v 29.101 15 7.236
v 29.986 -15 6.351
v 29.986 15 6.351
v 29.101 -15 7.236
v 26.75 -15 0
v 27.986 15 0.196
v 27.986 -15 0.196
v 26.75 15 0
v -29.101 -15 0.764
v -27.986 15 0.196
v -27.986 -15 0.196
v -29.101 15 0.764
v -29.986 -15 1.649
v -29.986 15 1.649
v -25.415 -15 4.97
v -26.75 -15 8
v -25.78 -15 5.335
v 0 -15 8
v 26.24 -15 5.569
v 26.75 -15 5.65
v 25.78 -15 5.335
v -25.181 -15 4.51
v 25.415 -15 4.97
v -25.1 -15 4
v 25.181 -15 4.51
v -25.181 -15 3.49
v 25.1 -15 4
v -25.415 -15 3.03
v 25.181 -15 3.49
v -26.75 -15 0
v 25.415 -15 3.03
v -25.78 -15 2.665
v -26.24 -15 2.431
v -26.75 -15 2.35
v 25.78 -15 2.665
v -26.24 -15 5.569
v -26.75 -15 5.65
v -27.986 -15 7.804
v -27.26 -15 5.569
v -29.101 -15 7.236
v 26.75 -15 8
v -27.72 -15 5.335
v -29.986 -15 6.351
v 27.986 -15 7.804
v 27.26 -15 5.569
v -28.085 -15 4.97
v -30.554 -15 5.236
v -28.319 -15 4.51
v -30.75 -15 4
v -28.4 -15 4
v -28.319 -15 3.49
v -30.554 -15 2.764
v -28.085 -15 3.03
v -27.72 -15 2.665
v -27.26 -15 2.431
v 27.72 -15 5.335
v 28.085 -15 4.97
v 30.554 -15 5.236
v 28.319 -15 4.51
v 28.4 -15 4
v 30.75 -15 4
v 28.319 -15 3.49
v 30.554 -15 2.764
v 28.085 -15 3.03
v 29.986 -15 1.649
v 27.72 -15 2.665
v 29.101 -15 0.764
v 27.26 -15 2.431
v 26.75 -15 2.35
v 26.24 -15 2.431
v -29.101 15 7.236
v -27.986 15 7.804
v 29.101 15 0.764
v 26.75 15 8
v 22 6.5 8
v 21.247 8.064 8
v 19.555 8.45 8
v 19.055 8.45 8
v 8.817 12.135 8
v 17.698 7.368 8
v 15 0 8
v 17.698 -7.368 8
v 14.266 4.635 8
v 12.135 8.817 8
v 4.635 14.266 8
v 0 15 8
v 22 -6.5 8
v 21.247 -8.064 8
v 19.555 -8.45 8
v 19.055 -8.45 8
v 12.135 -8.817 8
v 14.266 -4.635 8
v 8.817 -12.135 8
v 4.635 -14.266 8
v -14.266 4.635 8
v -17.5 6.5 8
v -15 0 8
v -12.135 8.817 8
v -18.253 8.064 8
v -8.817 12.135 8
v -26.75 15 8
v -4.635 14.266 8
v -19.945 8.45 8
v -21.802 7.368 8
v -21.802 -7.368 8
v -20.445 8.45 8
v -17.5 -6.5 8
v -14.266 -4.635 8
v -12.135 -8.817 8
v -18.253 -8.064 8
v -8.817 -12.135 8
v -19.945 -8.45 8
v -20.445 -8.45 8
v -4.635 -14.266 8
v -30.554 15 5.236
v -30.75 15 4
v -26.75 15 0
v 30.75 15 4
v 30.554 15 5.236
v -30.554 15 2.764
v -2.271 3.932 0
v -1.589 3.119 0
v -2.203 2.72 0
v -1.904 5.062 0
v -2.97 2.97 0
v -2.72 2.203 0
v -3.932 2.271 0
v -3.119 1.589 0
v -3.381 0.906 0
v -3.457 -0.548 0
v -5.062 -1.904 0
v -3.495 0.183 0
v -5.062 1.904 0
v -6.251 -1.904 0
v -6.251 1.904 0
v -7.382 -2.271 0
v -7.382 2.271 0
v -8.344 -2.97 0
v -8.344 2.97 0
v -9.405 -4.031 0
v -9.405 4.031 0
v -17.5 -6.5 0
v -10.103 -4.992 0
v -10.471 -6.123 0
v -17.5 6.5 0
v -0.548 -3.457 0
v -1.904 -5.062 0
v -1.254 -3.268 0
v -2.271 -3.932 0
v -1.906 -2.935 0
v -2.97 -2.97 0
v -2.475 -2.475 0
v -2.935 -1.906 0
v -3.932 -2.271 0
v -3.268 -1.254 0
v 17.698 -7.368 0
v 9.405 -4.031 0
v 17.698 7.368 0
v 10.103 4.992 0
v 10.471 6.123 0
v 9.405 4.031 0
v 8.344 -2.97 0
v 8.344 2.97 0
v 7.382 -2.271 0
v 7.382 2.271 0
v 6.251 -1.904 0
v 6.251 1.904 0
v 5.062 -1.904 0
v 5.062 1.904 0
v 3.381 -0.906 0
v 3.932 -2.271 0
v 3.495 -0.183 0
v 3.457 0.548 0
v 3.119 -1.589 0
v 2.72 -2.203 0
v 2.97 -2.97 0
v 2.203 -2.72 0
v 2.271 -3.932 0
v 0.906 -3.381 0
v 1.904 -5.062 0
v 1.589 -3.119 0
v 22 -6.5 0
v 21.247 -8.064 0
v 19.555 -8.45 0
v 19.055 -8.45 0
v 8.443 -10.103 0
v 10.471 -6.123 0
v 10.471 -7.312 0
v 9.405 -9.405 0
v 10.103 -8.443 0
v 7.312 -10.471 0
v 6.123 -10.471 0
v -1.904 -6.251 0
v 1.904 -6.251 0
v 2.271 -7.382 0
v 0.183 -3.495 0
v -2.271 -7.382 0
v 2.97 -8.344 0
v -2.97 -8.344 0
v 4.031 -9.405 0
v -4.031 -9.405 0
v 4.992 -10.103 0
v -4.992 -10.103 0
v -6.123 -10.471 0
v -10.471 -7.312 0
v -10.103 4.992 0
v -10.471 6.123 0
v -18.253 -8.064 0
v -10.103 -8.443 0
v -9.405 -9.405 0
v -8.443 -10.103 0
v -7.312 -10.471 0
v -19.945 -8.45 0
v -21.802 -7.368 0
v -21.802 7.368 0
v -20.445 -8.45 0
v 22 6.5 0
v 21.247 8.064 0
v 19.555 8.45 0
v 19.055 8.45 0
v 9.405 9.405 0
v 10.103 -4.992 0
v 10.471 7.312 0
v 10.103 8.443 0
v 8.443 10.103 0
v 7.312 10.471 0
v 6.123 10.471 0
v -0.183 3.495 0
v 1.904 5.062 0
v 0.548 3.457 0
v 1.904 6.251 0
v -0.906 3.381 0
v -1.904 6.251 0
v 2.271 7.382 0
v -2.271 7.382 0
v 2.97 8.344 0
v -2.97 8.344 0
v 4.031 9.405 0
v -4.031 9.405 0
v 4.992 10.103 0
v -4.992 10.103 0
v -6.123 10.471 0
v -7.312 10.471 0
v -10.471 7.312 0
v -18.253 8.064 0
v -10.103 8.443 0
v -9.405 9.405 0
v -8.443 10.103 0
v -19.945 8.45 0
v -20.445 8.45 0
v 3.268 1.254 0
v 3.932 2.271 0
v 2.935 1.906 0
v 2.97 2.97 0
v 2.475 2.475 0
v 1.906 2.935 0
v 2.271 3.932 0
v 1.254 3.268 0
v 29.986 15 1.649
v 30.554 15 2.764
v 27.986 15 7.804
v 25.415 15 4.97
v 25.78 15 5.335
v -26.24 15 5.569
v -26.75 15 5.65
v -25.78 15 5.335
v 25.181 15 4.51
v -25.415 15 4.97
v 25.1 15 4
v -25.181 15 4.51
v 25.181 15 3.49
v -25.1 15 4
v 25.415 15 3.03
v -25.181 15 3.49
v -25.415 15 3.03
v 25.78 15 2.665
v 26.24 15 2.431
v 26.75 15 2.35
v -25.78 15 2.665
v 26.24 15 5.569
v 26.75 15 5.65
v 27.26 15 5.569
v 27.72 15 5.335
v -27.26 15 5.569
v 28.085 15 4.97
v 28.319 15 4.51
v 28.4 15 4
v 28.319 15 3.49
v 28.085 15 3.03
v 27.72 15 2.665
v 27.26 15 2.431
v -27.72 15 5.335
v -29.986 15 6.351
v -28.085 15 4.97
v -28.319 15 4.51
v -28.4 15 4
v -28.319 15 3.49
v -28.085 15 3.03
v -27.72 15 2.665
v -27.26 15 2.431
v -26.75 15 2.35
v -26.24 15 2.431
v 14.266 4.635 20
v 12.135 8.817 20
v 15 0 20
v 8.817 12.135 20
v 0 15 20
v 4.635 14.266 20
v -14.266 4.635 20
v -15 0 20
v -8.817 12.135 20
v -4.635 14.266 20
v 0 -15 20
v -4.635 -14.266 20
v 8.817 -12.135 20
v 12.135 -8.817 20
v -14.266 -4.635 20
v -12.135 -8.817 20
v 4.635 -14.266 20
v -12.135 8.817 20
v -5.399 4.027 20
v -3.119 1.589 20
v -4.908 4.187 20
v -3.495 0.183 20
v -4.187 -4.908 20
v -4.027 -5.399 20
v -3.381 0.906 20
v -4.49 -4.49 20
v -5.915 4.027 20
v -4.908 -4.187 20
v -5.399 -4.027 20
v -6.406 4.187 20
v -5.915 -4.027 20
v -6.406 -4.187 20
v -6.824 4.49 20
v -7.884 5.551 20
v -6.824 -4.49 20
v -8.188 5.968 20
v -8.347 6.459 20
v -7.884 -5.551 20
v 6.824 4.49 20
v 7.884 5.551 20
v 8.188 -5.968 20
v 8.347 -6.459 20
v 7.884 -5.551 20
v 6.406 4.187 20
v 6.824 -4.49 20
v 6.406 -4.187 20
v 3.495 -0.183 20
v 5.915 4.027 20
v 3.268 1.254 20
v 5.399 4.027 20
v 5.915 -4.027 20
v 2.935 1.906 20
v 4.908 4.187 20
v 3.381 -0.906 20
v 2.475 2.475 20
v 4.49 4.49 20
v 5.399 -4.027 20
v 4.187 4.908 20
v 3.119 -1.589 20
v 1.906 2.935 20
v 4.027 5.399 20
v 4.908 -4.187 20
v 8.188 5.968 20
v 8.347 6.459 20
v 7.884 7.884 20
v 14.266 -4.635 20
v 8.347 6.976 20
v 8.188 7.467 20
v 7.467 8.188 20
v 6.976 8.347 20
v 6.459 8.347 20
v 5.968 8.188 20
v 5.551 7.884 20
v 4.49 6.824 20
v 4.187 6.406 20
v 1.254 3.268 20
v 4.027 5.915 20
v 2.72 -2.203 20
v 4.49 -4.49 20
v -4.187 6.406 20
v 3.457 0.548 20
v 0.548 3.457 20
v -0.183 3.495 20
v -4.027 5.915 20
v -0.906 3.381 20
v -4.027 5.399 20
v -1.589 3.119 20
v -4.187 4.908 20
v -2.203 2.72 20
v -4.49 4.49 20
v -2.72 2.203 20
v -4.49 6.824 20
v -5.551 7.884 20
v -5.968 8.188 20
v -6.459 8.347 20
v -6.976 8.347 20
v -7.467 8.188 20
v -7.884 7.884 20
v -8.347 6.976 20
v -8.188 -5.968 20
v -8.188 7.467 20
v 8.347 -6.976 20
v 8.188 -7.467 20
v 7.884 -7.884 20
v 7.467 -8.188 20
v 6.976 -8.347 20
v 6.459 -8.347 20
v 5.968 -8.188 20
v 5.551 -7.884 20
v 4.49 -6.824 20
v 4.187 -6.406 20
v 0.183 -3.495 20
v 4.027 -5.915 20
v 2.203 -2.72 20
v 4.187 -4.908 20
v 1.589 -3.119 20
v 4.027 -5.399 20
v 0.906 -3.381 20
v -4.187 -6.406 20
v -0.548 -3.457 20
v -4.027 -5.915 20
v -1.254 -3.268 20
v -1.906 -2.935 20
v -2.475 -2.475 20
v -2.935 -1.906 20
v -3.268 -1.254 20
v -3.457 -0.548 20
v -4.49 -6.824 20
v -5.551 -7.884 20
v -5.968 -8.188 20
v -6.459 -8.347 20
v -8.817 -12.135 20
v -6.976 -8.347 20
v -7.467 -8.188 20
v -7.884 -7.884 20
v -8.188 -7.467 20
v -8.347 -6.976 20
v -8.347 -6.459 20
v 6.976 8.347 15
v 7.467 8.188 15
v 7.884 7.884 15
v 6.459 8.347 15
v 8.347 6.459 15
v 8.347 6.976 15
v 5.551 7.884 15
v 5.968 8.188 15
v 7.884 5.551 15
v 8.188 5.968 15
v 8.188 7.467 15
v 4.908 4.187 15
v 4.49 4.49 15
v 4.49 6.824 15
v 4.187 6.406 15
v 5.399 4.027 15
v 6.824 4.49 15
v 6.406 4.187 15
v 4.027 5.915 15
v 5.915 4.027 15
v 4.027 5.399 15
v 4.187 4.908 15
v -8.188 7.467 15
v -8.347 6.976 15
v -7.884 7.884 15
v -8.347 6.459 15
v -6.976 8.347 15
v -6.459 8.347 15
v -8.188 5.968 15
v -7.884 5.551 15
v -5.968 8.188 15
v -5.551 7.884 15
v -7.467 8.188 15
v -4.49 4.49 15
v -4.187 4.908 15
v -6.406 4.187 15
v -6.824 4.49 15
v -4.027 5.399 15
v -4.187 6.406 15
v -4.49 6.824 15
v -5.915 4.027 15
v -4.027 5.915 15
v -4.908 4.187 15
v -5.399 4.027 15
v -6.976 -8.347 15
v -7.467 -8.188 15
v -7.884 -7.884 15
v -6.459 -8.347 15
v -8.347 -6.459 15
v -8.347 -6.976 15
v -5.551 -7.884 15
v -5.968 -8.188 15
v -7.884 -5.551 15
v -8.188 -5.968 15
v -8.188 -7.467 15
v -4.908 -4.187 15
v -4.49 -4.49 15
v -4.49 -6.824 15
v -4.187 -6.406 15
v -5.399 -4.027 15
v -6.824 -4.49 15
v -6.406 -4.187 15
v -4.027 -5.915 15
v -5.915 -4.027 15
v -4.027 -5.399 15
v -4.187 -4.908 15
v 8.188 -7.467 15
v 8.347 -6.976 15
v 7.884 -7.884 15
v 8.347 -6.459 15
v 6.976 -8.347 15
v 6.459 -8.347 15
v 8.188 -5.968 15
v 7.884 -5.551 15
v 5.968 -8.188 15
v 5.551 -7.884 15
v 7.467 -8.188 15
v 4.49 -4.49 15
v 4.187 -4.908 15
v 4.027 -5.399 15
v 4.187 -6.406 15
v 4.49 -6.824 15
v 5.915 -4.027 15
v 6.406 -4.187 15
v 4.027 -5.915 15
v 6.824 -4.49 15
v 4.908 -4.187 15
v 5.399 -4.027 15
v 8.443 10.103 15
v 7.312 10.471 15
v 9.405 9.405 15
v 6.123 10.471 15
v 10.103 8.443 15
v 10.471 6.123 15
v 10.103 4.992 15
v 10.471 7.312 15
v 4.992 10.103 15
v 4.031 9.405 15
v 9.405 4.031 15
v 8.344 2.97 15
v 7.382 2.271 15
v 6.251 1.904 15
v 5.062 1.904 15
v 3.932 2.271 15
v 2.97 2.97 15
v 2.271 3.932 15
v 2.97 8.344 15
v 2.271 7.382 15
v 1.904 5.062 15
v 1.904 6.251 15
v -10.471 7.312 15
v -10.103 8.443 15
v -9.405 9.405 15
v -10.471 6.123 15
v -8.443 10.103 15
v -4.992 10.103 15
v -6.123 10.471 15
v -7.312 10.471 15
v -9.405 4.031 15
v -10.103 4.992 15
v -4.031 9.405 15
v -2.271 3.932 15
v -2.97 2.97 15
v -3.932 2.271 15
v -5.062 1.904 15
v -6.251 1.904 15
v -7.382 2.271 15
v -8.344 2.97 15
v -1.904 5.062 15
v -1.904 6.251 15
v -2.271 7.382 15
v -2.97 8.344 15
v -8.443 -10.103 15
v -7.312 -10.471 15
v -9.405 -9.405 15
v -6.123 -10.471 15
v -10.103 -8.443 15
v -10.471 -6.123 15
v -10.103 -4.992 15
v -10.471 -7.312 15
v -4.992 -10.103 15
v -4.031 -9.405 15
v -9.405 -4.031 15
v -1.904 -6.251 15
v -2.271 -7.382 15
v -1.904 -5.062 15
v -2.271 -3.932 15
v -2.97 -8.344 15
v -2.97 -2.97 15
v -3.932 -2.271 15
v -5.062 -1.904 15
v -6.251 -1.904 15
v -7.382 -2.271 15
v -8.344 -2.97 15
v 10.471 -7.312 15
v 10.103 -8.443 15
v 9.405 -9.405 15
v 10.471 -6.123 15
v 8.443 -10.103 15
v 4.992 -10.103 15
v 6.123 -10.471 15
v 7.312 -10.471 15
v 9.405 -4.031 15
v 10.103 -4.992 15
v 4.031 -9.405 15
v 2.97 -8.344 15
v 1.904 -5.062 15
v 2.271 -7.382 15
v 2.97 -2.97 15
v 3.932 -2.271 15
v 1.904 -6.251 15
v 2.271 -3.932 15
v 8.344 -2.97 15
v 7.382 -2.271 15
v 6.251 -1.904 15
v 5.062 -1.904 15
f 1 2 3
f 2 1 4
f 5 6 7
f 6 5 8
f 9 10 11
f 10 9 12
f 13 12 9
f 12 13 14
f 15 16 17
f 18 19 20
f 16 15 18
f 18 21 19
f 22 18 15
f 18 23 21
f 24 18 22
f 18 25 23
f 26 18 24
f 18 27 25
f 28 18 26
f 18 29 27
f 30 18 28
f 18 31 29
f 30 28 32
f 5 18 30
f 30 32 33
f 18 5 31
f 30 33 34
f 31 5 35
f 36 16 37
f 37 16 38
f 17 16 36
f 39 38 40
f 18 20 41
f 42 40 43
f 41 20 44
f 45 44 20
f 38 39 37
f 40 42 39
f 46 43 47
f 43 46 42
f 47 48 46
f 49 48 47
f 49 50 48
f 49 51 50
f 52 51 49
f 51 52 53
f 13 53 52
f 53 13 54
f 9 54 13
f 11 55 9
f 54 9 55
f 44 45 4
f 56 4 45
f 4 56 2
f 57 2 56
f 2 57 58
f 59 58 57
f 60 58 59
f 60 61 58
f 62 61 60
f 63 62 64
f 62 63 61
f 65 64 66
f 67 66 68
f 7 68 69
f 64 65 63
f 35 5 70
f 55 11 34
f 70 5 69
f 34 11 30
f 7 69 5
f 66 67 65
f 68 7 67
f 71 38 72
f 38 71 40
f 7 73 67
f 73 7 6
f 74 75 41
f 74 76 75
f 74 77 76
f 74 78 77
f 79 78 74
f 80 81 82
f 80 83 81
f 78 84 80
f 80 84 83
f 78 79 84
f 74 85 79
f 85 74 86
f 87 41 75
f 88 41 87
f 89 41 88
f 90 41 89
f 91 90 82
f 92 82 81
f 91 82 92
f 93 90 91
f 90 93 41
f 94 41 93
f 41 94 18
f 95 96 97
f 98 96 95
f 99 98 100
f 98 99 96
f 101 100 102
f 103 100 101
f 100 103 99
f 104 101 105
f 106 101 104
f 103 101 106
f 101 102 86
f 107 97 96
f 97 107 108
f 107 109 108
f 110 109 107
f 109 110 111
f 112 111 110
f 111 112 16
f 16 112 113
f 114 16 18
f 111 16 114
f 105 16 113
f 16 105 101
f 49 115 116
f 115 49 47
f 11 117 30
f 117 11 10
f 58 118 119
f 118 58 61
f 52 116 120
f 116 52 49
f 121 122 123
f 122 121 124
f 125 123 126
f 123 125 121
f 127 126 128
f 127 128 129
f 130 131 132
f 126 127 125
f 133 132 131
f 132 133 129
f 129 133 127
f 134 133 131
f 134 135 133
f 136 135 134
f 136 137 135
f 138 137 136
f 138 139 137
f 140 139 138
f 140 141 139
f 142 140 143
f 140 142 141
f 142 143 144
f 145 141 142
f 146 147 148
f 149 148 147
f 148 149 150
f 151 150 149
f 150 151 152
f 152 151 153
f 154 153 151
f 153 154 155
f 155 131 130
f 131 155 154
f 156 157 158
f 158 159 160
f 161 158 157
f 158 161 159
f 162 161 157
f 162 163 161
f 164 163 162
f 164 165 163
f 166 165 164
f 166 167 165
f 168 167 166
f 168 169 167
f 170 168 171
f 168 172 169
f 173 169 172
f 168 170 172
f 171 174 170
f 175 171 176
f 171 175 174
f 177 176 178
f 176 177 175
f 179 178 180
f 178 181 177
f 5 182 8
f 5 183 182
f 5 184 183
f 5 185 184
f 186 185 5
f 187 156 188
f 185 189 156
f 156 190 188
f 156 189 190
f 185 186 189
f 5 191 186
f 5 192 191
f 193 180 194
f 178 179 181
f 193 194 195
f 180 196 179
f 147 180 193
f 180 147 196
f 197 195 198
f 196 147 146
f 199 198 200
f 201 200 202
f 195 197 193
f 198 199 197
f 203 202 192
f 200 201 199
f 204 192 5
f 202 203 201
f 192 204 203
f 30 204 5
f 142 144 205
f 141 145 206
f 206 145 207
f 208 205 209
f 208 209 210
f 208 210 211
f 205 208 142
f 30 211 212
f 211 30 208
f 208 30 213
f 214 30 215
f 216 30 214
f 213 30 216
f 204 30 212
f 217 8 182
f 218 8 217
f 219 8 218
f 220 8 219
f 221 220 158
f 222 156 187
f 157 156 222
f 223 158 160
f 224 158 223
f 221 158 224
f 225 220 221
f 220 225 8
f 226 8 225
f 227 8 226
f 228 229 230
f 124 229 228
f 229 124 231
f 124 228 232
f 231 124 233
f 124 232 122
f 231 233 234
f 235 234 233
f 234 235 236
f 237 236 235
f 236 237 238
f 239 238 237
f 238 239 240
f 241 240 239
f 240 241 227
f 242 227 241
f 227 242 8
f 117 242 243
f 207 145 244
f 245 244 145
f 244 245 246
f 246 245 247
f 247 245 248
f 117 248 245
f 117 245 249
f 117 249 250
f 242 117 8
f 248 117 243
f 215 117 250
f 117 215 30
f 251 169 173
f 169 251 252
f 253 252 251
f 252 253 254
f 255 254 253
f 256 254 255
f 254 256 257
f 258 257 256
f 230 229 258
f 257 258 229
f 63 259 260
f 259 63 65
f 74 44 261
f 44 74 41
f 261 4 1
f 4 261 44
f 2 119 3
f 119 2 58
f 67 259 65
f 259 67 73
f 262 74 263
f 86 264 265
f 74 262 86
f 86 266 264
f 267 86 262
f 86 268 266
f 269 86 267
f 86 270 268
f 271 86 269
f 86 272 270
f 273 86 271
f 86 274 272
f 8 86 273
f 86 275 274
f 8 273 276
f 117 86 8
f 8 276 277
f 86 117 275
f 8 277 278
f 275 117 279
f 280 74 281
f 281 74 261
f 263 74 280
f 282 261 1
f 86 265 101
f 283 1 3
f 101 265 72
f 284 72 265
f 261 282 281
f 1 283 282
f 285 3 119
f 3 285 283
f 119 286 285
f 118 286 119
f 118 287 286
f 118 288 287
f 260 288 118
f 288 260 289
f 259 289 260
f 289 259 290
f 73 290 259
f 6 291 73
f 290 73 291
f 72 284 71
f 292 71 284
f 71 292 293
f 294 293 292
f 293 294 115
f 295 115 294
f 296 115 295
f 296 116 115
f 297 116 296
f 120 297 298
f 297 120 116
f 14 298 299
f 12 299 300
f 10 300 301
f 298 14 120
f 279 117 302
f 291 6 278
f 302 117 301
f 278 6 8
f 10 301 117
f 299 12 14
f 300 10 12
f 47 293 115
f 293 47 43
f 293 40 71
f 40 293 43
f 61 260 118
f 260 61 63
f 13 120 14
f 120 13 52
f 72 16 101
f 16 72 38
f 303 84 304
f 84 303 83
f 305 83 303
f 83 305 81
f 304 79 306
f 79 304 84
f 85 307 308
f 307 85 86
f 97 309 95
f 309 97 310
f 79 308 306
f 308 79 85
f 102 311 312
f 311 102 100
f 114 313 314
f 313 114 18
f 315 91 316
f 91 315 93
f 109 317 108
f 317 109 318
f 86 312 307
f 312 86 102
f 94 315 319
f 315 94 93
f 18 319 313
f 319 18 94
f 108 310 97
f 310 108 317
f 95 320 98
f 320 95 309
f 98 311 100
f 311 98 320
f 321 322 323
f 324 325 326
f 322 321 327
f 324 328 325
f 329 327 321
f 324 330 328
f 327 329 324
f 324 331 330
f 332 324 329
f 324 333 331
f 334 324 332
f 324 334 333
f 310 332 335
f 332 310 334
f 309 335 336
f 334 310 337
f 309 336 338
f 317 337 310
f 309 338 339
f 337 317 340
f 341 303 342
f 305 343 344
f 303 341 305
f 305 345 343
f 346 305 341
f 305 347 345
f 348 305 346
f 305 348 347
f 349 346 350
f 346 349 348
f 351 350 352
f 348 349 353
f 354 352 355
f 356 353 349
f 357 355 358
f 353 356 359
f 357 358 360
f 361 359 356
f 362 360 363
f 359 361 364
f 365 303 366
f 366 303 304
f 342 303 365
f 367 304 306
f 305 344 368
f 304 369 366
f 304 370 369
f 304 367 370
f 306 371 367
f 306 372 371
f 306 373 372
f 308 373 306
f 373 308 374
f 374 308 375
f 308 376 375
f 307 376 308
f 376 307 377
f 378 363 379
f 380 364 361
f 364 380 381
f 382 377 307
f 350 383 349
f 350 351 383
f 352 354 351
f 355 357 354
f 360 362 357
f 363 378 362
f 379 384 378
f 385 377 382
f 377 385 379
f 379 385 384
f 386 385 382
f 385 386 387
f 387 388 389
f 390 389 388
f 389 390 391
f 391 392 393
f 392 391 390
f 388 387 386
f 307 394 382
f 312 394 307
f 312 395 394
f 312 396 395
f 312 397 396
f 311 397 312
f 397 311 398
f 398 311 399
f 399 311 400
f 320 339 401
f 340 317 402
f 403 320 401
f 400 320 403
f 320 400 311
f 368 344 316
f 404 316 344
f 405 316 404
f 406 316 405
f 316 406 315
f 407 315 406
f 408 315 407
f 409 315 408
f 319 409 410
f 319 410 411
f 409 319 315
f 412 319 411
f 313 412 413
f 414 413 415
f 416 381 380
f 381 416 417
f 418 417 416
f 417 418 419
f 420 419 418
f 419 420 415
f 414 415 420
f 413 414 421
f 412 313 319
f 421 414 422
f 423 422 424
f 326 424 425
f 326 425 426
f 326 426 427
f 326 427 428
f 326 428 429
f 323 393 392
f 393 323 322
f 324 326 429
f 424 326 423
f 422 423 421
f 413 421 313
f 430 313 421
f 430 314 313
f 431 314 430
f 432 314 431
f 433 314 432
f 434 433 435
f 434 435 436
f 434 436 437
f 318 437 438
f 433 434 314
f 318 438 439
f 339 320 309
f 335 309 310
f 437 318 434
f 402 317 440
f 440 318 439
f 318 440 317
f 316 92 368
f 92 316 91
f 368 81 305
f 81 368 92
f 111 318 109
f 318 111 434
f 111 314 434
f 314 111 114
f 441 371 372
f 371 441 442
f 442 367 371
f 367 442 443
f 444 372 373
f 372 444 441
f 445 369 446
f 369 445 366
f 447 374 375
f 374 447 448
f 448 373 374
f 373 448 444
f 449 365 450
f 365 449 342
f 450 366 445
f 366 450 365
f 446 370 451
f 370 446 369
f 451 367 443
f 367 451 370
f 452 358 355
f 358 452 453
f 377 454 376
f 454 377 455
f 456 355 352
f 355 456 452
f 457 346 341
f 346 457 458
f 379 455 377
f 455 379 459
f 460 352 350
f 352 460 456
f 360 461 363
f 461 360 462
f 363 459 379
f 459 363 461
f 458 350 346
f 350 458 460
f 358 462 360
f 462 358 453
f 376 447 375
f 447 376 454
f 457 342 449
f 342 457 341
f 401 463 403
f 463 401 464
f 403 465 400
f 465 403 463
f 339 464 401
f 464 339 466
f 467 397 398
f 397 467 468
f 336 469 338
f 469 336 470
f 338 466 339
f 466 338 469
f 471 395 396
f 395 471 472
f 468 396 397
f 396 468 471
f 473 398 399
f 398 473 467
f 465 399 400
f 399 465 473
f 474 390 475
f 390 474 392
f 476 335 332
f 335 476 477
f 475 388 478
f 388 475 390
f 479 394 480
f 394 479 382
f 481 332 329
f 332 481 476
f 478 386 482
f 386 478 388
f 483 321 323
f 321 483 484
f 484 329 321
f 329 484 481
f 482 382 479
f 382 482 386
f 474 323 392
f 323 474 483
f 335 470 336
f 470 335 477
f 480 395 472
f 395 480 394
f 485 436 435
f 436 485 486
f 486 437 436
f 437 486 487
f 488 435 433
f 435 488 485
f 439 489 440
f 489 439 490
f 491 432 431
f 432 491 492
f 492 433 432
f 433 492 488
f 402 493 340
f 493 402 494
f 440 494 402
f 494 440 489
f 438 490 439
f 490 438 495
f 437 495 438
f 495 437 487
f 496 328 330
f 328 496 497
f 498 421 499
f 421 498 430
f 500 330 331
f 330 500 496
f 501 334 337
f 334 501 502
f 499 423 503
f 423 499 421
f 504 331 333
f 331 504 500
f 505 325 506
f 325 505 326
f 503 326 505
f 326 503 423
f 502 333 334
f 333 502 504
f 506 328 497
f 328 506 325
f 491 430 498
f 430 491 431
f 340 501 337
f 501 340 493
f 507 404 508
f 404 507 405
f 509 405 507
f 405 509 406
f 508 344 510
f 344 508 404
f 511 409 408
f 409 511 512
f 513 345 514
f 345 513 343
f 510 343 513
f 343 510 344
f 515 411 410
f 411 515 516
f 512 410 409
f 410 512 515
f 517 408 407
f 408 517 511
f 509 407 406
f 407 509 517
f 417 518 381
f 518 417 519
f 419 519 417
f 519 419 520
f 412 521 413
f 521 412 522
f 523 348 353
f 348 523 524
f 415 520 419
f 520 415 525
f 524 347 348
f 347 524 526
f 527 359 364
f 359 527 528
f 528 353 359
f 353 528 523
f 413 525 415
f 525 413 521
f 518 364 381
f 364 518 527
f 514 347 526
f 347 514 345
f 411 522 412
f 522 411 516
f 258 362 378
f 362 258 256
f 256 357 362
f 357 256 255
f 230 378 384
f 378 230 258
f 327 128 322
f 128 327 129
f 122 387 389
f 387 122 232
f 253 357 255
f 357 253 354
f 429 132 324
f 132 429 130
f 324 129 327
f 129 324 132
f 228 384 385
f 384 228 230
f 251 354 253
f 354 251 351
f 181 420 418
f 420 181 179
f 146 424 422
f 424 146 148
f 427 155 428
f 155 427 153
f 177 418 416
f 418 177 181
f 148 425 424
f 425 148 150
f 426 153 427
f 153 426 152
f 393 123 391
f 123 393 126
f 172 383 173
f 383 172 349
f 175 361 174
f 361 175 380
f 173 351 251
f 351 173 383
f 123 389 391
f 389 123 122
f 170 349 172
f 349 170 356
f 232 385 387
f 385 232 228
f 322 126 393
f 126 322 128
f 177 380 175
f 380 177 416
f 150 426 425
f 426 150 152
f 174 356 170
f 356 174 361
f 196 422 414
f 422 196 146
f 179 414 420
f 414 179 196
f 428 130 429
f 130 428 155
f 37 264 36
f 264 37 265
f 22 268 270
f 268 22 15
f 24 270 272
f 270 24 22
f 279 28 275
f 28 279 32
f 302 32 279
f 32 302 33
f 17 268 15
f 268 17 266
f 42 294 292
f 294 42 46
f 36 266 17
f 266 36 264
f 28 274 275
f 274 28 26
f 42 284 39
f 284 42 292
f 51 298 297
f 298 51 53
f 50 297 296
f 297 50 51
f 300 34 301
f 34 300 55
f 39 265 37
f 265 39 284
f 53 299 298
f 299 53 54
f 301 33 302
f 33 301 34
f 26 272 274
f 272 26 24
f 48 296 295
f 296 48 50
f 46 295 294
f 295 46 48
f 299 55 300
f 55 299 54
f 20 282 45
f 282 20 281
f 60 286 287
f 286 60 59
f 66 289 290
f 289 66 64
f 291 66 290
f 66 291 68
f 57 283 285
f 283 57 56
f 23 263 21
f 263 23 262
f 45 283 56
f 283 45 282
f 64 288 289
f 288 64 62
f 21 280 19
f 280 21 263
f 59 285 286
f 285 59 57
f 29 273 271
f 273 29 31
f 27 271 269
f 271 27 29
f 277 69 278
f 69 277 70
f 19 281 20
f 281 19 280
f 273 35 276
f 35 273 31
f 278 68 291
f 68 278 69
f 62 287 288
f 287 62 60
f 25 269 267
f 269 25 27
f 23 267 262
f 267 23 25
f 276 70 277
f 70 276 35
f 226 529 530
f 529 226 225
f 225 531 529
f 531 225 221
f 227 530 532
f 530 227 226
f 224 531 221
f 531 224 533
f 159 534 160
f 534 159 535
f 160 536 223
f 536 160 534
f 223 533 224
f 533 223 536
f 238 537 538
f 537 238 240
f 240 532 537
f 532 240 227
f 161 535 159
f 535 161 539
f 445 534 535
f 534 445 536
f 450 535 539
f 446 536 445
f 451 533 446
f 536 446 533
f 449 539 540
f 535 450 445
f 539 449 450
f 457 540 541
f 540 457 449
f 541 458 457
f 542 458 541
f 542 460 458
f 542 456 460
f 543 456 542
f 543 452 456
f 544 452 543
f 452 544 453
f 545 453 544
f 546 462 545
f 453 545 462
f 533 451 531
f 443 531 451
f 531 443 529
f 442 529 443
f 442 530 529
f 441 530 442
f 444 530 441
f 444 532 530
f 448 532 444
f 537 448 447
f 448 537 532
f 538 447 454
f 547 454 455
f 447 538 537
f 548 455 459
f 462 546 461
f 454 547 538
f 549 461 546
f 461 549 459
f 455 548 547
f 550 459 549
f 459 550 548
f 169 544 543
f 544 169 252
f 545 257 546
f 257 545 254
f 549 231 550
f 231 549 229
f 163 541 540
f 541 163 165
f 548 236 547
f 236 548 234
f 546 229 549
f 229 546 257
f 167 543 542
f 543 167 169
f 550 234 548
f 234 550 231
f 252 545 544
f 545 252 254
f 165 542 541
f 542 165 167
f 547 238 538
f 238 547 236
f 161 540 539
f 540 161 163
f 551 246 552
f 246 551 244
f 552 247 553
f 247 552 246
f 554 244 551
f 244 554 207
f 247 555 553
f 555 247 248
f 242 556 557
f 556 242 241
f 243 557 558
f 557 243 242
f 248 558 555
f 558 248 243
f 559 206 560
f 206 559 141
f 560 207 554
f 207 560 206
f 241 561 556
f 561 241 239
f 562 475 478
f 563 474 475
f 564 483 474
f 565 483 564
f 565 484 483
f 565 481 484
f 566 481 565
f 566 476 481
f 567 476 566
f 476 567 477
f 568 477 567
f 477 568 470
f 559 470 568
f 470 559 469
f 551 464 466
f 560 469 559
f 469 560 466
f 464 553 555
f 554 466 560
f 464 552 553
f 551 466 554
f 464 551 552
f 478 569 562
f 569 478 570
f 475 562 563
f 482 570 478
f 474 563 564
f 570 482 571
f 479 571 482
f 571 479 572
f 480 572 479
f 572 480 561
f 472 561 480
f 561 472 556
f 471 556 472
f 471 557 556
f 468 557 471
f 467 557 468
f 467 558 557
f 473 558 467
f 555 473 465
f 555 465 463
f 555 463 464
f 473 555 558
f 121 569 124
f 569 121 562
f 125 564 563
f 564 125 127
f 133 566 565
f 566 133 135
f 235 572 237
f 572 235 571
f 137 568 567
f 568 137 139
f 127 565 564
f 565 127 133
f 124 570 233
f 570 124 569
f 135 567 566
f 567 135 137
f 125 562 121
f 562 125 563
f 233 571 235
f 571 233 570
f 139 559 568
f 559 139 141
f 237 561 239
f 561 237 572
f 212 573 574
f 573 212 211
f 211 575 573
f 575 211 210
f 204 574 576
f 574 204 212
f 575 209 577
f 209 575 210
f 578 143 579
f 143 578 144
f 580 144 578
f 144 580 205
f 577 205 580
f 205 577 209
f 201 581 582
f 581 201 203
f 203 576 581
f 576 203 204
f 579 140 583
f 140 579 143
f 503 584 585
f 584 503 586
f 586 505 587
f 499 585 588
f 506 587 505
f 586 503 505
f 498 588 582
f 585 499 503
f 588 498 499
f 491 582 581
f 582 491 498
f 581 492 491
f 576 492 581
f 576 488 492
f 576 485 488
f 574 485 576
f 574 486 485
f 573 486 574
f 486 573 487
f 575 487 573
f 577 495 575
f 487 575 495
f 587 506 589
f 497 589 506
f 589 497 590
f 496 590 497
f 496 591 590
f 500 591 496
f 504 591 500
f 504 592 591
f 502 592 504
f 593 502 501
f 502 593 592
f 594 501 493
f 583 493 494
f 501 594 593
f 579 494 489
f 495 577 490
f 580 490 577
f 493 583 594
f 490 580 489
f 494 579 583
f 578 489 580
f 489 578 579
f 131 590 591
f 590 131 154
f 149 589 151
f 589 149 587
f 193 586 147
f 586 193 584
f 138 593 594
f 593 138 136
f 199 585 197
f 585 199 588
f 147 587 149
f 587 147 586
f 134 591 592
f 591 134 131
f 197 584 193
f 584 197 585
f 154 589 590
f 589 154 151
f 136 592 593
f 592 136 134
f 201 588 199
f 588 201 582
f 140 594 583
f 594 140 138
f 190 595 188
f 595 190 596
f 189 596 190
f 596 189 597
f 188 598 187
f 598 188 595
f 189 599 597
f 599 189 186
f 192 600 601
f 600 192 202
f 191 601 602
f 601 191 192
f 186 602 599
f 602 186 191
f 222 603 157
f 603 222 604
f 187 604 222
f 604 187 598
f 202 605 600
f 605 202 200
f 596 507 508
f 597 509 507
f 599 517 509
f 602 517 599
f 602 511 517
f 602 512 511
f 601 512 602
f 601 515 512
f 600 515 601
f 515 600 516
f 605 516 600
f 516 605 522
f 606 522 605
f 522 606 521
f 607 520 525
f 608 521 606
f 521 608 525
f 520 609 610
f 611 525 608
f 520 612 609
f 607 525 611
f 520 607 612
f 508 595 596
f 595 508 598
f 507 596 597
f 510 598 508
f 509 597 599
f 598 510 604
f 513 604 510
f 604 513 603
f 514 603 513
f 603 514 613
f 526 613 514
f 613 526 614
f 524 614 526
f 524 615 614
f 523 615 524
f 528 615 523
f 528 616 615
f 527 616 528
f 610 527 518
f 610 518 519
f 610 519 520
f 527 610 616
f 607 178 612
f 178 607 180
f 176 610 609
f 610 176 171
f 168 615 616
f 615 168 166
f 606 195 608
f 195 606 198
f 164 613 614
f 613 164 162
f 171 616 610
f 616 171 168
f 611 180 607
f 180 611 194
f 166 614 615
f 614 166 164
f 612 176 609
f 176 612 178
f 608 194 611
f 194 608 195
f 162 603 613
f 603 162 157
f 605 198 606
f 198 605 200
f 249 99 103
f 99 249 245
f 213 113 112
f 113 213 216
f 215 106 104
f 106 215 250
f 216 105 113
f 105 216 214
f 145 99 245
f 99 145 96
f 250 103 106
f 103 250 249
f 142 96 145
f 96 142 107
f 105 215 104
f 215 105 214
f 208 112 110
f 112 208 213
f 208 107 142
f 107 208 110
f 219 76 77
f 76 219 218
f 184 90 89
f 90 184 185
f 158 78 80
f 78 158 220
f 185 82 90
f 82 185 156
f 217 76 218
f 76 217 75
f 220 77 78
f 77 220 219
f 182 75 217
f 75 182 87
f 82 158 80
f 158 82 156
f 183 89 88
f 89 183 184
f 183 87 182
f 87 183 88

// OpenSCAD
// file: dronePlates.scad
/**
 * dronePlates.scad
 * Plate library
 *
 * GNU GPL V3
 * @author: Victor Potenciano
 */

m3Rad = 3.4/2;
cornerR = 4;

/**
 *
 */
module helperDisk(diameter) {
	cylinder(r = diameter/2, h = 0.6, $fn=20);
}

/**
 *
 */
module roundedRect(size, radius) {
	x = size[0];
	y = size[1];
	z = size[2];

	linear_extrude(height=z)
	hull() {
	// place 4 circles in the corners, with the given radius
	translate([(-x/2)+(radius/2), (-y/2)+(radius/2), 0]){ circle(r=radius); }
	translate([(x/2)-(radius/2), (-y/2)+(radius/2), 0]){ circle(r=radius); }
	translate([(-x/2)+(radius/2), (y/2)-(radius/2), 0]){ circle(r=radius); }
	translate([(x/2)-(radius/2), (y/2)-(radius/2), 0]){ circle(r=radius); }
	}
}

/**
 * rounded rectangle triangle with corner at origin
 */
module roundedTriangle(size, radius) {
	x = size[0];
	y = size[1];
	z = size[2];

	linear_extrude(height=z)
	hull() {
	translate([radius, radius, 0]){ circle(r=radius); }
	translate([x-radius, radius, 0]){ circle(r=radius); }
	translate([radius, y-radius, 0]){ circle(r=radius); }
	}
}

/**
 *
 */
module roundRectPlate(w, l, plateThick=3) {
	difference(){
		roundedRect([l+m3Rad*1.75,w+m3Rad*1.75,plateThick], cornerR);
		translate([l/2, w/2, -0.5]) { cylinder(h = plateThick+1, r = m3Rad, $fn=30); }
		translate([-l/2, w/2, -0.5]) { cylinder(h = plateThick+1, r = m3Rad, $fn=30); }
		translate([l/2, -w/2, -0.5]) { cylinder(h = plateThick+1, r = m3Rad, $fn=30); }
		translate([-l/2, -w/2, -0.5]) { cylinder(h = plateThick+1, r = m3Rad, $fn=30); }
	}
}

/**
 *
 */
module crossSquarePlate(l, thick=3) {
	inDist = cornerR*2+4;
	trianL = sqrt((l*l)/2)-inDist;
	centerR = 4;

	difference(){
		roundRectPlate(l, l, thick);
		translate([0, centerR, -0.5]) { 
			rotate([0,0,45]){ roundedTriangle([trianL,trianL,thick+1], cornerR-2); }
		}
		translate([0, -centerR, -0.5]) { 
			rotate([0,0,225]){ roundedTriangle([trianL,trianL,thick+1], cornerR-2); }
		}
		translate([-centerR, 0, -0.5]) { 
			rotate([0,0,135]){ roundedTriangle([trianL,trianL,thick+1], cornerR-2); }
		}
		translate([centerR, 0, -0.5]) { 
			rotate([0,0,-45]){ roundedTriangle([trianL,trianL,thick+1], cornerR-2); }
		}
	}
}

/**
 *
 */
module hShapePlate(w, l, thick=4) {
	inDist = cornerR*2+1;

	difference(){
		roundRectPlate(w, l, thick);
		translate([0, w/4, -0.5]) { roundedRect([l-inDist,w/2-inDist,thick+1], cornerR-2); }
		translate([0, -w/4, -0.5]) { roundedRect([l-inDist,w/2-inDist,thick+1], cornerR-2); }
	}
}

/**
 *
 */
module motorCircleMount(inDia, outDia, thick=3, extraH=false, d1=19, d2=16, holeR=m3Rad ) {
	difference(){
		cylinder(h = thick, r = outDia/2, $fn=30);
		motorCircleMountHoles(inDia, outDia, thick, extraH, d1=d1, d2=d2, holeR=holeR);
	}
}

/**
 *
 */
module motorCircleMountHoles(inDia, outDia, thick=3, extraH=false, d1=19, d2=16, d3=25, holeR=m3Rad) {
	translate([0, 0, -0.5]) { cylinder(h = thick+1, r = inDia/2, $fn=30); }

	for(i=[0:3]) {
		rotate([0,0,90*i]){
		translate([d1/2, 0, -0.5]) cylinder(h = thick+1, r = holeR, $fn=20);
		translate([d2/2, 0, -0.5]) cylinder(h = thick+1, r = holeR, $fn=20);
		translate([d2/2, -holeR, -0.5]) cube(size = [(d1-d2)/2,holeR*2,thick+1]);
		}
	}
	
	if(extraH==true){	
		for(i=[-1,1]) translate([i*d3/2, 0, -0.5]) { cylinder(h = thick+1, r = holeR, $fn=30); }
	}
}

/**
 *
 */
module motorRectMount(w, l, inDia, thick=3) {
	d1=19;
	d2=16;

	difference(){
		roundRectPlate(w, l, thick);
		translate([0, 0, -0.5]) { cylinder(h = thick+1, r = inDia/2, $fn=30); }
		translate([0, d1/2, -0.5]) { cylinder(h = thick+1, r = m3Rad, $fn=30); }
		translate([0, -d1/2, -0.5]) { cylinder(h = thick+1, r = m3Rad, $fn=30); }
		translate([d2/2, 0, -0.5]) { cylinder(h = thick+1, r = m3Rad, $fn=30); }
		translate([-d2/2, 0, -0.5]) { cylinder(h = thick+1, r = m3Rad, $fn=30); }
	}
}

/**
 *
 */
module tube(inDia, outDia, height) {
	difference(){
		cylinder(h = height, r = outDia/2, $fn=50);
		translate([0, 0, -0.5]) { cylinder(h = height+1, r = inDia/2, $fn=30); }
	}
}

/**
 *
 */
module squareTube(inDia, outDia, height) {
	translate([0,0,height/2]){
	difference(){
		cube(size = [outDia,outDia,height], center = true);
		cube(size = [inDia,inDia,height+1], center = true);
	}
	}
}

/**
 *
 */
module djiFlamewheelHoles(height) {
	a = 23;
	b = 16;
	c = 19.5;
	
	translate([a/2, c/2, 0]) { cylinder(h = height, r = m3Rad, $fn=30); }
	translate([-a/2, c/2, 0]) { cylinder(h = height, r = m3Rad, $fn=30); }
	translate([b/2, -c/2, 0]) { cylinder(h = height, r = m3Rad, $fn=30); }
	translate([-b/2, -c/2, 0]) { cylinder(h = height, r = m3Rad, $fn=30); }
}

/**
 *
 */
module djiFlamewheelHolesBotton(height) {
	a1 = 21;
	c = 19.5;
	
	translate([a1/2, c/2, 0]) { cylinder(h = height, r = m3Rad, $fn=30); }
	translate([-a1/2, c/2, 0]) { cylinder(h = height, r = m3Rad, $fn=30); }
}

/**
 *
 */
module propeller(size){
union(){
difference(){
	cylinder(h = 3, r = size/2, center=true, $fn=30);
	cylinder(h = 3.1, r = size/2-2, center=true, $fn=30); 
}
for( i = [-1,1] ){
rotate([0,0,45*i]){ cube(size = [size,4,1], center = true); }
}
}
}

/**
 *
 */
module slot(length, height, rad){
for(i=[-1,1]) translate([i*length/2,0,0]) cylinder(h = height, r = rad, $fn=30);
translate([0,0,height/2]) cube(size = [length,rad*2,height], center = true);
}

 

////////////////////////
// Examples:
////////////////////////

motorCircleMount(8, 25, 3.5);

//roundedRect([50,50,3], 4);

//hShapePlate(79, 25);

//rotate([0,0,45]){roundedTriangle([40,40,3], 4);}

//crossSquarePlate(45, 4);

/*
union(){
motorRectMount(21, 18, 8, 4);
translate([9, 10.5, 0]) {tube(m3Rad*2, 6.5, 6);}
}
*/

/*
difference(){
union(){
hShapePlate(50, 30, 3.5);
translate([-4,-25,0]){cube(size = [8,50,3.5]);}
rotate([0, 0, 45]) {motorCircleMount(8, 35, 3.5);}
}
cylinder(h = 10, r = 4, $fn=100, center=true);
}
*/

//rotate([90,0,0]){ tube(5,10,20); }
//translate([20,0,0]){ squareTube(5, 10, 20); }
// main file
/**
 * cinetank gimbal mount
 */

use <dronePlates.scad>

m3Rad = 3.3/2;
holeDist=53.5;
height=30;
tubeRad=8/2;
protr=20;

difference(){
union(){
hull(){
for(i=[-1,1]) translate([i*holeDist/2,0,tubeRad]) rotate([90,0,0]) cylinder(r=tubeRad, h=height, $fn=20, center=true);
}//hull
cylinder(r=height/2,h=protr,$fn=20);
}

translate([0,0,0]){
rotate([0,0,45]) motorCircleMountHoles(7, height, thick=50, d1=19, d2=16, holeR=m3Rad );
}

for(i=[-1,1]) translate([i*holeDist/2,0,tubeRad]) rotate([90,0,0]) cylinder(r=m3Rad, h=height, $fn=20, center=true);
    
translate([0,0,0.5-5]){
rotate([0,0,45]) motorCircleMountHoles(7, height, thick=protr-1, d1=19, d2=16, holeR=m3Rad*2+0.5 );
}
 
for(i=[-1,1]) translate([i*(holeDist/2-7),0,0]) roundedRect([2.5,15,tubeRad*2],2);
}//diff
